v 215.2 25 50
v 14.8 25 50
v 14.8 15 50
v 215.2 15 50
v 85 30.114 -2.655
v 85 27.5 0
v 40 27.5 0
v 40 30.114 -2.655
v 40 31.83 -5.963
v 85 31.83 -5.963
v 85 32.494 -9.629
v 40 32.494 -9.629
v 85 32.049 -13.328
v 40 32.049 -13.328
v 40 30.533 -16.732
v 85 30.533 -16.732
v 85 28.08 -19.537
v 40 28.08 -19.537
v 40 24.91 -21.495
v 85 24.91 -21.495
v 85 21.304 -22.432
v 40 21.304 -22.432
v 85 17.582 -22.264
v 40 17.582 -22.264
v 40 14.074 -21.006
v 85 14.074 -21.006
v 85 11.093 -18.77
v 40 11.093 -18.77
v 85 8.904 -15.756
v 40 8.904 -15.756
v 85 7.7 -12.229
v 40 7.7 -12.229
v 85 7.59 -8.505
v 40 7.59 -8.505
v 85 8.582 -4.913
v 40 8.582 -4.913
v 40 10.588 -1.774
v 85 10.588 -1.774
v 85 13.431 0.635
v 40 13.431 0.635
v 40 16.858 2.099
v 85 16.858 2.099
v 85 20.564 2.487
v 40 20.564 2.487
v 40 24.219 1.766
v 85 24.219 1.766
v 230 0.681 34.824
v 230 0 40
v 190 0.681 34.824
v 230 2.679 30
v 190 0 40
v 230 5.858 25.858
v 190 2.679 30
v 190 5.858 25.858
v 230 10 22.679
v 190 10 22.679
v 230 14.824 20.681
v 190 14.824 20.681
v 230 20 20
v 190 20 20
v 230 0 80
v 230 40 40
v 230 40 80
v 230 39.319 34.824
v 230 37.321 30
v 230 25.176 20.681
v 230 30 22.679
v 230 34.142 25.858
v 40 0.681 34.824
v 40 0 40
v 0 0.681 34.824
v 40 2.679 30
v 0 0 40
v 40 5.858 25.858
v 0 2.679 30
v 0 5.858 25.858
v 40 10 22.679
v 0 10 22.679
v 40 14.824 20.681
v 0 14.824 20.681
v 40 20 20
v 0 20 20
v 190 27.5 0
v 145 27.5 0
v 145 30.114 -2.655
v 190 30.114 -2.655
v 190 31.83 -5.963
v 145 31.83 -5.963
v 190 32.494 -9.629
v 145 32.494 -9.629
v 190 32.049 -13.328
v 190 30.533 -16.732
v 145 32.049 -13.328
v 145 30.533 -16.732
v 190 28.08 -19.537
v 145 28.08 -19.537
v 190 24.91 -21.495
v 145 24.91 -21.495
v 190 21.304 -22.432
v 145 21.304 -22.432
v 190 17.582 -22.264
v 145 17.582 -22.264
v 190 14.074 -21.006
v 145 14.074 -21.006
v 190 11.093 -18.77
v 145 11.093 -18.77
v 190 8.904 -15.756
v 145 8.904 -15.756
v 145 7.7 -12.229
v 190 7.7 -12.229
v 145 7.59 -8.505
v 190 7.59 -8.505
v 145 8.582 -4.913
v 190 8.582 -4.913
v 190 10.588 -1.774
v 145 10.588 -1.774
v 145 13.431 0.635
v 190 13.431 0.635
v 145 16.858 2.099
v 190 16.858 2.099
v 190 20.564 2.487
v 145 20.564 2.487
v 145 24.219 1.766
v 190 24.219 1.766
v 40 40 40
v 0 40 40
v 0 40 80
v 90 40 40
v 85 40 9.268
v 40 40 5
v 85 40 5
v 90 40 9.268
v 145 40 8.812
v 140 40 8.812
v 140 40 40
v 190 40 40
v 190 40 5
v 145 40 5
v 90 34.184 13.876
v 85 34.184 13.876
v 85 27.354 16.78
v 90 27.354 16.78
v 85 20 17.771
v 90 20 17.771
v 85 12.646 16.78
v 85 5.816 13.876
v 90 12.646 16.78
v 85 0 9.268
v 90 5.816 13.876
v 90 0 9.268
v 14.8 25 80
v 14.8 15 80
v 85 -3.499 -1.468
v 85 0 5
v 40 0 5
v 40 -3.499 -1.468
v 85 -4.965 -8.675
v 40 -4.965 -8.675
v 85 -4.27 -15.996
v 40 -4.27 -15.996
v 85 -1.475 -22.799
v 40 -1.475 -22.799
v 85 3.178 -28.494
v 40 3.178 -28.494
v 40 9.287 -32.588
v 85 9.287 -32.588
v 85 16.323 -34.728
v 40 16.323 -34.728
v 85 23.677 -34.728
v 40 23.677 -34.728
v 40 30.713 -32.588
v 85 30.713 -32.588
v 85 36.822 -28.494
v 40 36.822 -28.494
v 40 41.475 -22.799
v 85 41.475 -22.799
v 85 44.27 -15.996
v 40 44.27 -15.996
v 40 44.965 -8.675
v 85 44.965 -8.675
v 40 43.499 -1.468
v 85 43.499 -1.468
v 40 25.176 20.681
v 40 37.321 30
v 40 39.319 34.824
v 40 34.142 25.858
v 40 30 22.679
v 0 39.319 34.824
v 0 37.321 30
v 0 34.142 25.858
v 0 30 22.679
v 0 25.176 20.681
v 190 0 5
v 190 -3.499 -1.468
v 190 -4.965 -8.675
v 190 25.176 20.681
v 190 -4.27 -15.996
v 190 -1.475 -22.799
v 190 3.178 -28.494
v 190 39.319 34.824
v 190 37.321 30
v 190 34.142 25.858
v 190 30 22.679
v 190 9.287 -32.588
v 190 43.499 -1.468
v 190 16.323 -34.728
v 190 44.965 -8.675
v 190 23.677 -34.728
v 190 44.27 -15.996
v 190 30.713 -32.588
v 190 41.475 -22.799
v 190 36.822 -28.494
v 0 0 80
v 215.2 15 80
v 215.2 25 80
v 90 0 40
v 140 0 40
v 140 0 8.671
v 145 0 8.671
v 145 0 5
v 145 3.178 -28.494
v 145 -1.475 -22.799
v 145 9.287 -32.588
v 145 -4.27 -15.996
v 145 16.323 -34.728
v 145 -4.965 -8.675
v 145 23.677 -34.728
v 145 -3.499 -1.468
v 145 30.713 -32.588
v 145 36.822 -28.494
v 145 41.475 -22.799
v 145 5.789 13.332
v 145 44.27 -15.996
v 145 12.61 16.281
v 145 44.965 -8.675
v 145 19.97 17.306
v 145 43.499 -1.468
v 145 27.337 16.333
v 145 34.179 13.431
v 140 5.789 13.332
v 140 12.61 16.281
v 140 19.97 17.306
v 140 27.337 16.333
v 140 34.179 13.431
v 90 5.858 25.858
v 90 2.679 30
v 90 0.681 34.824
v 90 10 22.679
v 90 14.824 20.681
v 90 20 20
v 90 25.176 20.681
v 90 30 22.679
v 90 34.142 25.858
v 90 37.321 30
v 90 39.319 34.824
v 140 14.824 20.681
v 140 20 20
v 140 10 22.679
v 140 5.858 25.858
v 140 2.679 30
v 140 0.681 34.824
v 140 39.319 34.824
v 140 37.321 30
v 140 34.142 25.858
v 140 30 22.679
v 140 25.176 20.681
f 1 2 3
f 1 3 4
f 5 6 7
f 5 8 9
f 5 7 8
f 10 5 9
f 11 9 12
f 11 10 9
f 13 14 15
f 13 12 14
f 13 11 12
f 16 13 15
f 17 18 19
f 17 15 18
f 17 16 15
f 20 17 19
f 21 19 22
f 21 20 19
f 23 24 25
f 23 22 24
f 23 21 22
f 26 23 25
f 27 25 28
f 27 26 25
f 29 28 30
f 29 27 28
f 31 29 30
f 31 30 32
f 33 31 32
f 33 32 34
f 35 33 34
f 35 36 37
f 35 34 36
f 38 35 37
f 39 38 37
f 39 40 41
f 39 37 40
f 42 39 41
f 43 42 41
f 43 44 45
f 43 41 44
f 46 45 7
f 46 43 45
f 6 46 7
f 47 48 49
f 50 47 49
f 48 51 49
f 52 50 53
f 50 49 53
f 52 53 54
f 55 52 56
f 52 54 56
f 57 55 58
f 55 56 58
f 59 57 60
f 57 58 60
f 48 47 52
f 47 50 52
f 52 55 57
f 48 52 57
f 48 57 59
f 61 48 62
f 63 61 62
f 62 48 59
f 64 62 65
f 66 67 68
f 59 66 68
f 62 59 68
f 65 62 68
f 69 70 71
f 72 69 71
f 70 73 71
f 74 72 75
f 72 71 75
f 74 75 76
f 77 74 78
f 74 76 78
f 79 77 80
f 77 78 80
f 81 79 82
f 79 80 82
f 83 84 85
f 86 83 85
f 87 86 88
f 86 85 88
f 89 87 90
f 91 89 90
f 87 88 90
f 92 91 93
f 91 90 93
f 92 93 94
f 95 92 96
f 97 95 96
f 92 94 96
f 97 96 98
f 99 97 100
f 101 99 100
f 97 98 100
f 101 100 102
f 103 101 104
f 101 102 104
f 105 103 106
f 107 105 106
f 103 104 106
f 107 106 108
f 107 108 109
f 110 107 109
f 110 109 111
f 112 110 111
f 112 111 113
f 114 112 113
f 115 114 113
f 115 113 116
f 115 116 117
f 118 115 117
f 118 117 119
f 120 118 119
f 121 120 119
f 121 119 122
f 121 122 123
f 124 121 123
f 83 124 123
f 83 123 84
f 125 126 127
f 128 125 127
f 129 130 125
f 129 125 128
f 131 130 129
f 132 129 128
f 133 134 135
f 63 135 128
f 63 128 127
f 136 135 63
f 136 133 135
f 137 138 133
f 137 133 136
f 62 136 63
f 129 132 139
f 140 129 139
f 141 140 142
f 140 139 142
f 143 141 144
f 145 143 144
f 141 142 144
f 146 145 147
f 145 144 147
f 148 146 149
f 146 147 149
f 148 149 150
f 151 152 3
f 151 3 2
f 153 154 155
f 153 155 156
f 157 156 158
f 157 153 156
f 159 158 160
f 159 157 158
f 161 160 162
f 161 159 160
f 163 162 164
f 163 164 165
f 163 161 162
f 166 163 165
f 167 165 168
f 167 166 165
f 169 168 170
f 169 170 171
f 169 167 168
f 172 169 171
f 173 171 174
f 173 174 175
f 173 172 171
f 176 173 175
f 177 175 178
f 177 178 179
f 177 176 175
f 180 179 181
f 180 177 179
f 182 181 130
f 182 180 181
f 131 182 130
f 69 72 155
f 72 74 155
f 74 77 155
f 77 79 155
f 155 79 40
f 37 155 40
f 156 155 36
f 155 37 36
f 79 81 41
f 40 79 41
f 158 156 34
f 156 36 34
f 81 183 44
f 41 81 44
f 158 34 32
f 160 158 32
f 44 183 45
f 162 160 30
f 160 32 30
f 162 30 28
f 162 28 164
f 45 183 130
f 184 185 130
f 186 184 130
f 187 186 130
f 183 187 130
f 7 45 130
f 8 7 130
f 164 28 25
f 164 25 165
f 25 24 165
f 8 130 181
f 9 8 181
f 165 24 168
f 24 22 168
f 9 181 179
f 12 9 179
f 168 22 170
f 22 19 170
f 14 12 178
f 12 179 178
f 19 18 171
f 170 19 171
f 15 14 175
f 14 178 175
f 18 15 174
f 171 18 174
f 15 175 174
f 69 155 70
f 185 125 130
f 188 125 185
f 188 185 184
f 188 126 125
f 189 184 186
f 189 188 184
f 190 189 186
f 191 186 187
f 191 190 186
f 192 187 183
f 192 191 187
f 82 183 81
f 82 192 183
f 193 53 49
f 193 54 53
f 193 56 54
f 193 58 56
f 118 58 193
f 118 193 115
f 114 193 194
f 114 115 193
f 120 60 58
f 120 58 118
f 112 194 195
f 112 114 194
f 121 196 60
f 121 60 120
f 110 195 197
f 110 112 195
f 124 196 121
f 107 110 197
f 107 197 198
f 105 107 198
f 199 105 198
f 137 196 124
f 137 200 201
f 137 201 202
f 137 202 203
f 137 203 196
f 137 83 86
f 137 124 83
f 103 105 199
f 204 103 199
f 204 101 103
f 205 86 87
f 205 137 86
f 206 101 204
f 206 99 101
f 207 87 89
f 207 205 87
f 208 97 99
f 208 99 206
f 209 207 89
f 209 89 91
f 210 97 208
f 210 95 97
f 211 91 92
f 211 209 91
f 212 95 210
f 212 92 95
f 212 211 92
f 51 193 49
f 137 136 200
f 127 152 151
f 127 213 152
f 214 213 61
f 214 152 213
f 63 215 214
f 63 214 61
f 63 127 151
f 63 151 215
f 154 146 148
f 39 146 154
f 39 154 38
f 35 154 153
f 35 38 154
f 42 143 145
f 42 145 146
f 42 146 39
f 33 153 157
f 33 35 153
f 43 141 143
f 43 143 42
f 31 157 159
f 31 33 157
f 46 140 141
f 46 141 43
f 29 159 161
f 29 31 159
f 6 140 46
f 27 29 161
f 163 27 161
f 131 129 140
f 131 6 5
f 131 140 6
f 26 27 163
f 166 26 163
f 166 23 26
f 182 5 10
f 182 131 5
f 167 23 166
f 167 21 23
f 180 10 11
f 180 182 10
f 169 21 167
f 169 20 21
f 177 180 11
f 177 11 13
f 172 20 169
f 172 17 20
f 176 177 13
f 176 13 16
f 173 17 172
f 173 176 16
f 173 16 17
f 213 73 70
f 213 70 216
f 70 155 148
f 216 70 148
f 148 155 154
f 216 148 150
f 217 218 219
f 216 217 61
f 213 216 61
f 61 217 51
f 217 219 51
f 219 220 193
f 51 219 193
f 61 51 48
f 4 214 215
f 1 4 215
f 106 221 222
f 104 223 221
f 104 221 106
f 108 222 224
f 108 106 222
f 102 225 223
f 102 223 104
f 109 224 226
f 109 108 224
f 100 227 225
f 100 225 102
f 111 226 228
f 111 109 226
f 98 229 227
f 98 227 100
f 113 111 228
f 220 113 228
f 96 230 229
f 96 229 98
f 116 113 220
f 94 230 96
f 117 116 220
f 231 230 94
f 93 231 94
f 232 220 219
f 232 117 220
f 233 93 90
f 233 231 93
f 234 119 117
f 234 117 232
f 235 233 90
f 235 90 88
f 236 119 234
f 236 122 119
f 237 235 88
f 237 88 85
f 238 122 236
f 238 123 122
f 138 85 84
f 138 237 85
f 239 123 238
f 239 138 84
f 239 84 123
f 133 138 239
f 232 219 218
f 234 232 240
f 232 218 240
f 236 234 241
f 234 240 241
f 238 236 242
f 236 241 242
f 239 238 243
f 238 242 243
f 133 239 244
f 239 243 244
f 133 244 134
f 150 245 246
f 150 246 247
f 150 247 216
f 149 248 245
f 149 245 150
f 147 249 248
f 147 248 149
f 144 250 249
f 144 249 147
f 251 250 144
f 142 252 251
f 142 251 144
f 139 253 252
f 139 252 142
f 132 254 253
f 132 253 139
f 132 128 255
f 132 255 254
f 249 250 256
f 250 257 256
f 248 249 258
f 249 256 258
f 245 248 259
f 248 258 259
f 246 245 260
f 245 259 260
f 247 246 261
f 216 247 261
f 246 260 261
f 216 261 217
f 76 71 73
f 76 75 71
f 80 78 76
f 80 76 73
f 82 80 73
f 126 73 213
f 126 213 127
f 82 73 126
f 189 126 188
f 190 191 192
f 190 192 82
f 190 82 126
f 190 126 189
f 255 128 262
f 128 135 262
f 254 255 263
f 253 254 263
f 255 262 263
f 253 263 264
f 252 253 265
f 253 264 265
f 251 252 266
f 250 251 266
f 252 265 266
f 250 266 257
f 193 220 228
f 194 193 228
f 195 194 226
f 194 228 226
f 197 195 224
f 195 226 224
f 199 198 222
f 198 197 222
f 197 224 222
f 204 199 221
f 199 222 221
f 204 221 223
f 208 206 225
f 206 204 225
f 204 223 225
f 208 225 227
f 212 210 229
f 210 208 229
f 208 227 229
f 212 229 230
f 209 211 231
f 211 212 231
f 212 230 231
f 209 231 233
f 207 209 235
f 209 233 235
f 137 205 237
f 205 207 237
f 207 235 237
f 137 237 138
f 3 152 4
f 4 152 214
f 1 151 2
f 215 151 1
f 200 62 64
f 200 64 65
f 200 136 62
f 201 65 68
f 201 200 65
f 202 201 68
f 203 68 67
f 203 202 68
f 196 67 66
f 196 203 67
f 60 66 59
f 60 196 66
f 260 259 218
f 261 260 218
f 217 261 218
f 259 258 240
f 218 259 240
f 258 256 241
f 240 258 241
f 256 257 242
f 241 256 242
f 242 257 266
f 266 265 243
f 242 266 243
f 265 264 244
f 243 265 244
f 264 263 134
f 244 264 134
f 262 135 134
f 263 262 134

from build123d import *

# Parameters (mm, degrees)
SKETCH2_W            = 230
SKETCH2_H            = 40
BOSS_EXTRUDE1_DEPTH  = 80
SKETCH3_W            = 200.4
SKETCH3_H            = 10
CUT_EXTRUDE1_DEPTH   = 30
SKETCH6_R            = 25
BOSS_EXTRUDE3_DEPTH  = 50
SKETCH7_R            = 12.5
CUT_EXTRUDE2_DEPTH   = 50
SKETCH8_R            = 26.5
CUT_EXTRUDE3_DEPTH   = 25
CUT_EXTRUDE4_START   = 40
SKETCH11_R           = 26.5
CUT_EXTRUDE4_DEPTH   = 40
SKETCH14_W           = 12.614661349
SKETCH14_H           = 40
CUT_EXTRUDE6_DEPTH   = 50
FILLET3_R            = 20
FILLET3_OF_MIRROR5_R = 20
FILLET3_OF_MIRROR8_R = 20
SKETCH15_R           = 27.771194789
CUT_EXTRUDE7_DEPTH   = 5
SKETCH21_R           = 27.635802496
CUT_EXTRUDE8_DEPTH   = 5


with BuildPart() as part:
    # Sketch2 → Boss-Extrude1 (new body)
    with BuildSketch(Plane.XY):
        with Locations((115, 20)):
            Rectangle(SKETCH2_W, SKETCH2_H)
    extrude(amount=BOSS_EXTRUDE1_DEPTH)

    # Sketch3 → Cut-Extrude1 (cut)
    with BuildSketch(Plane.XY.offset(80)):
        with Locations((115, 20)):
            Rectangle(SKETCH3_W, SKETCH3_H)
    extrude(amount=-CUT_EXTRUDE1_DEPTH, mode=Mode.SUBTRACT)

    # Sketch6 → Boss-Extrude3 (add)
    with BuildSketch(Plane(origin=(140, 0, 0), x_dir=(0, 0, -1), z_dir=(1, 0, 0))):
        with Locations((10, 20)):
            Circle(SKETCH6_R)
    boss_extrude3 = extrude(amount=BOSS_EXTRUDE3_DEPTH)

    # Sketch7 → Cut-Extrude2 (cut)
    with BuildSketch(Plane.ZY.offset(-140)):
        with Locations(Location((-10, 20, 0), (0, 0, 36.869897646))):
            Circle(SKETCH7_R)
    cut_extrude2 = extrude(amount=-CUT_EXTRUDE2_DEPTH, mode=Mode.SUBTRACT)

    # Sketch8 → Cut-Extrude3 (cut)
    with BuildSketch(Plane.ZY.offset(-140)):
        with Locations((-10, 20)):
            Circle(SKETCH8_R)
    cut_extrude3 = extrude(amount=CUT_EXTRUDE3_DEPTH, mode=Mode.SUBTRACT)

    # Sketch11 → Cut-Extrude4 (cut)
    with BuildSketch(Plane(origin=(190, 0, 0), x_dir=(0, 0, -1), z_dir=(1, 0, 0)).offset(CUT_EXTRUDE4_START)):
        with Locations((10, 20)):
            Circle(SKETCH11_R)
    cut_extrude4 = extrude(amount=-CUT_EXTRUDE4_DEPTH, mode=Mode.SUBTRACT)

    # Mirror1: Boss-Extrude3, Cut-Extrude2, Cut-Extrude3, Cut-Extrude4 across plane
    add(boss_extrude3.mirror(Plane(origin=(115, 0, 0), x_dir=(0, 0, 1), z_dir=(1, 0, 0))))
    add(cut_extrude2.mirror(Plane(origin=(115, 0, 0), x_dir=(0, 0, 1), z_dir=(1, 0, 0))), mode=Mode.SUBTRACT)
    add(cut_extrude3.mirror(Plane(origin=(115, 0, 0), x_dir=(0, 0, 1), z_dir=(1, 0, 0))), mode=Mode.SUBTRACT)
    add(cut_extrude4.mirror(Plane(origin=(115, 0, 0), x_dir=(0, 0, 1), z_dir=(1, 0, 0))), mode=Mode.SUBTRACT)

    # Sketch14 → Cut-Extrude6 (cut)
    with BuildSketch(Plane(origin=(90, 0, 0), x_dir=(0, 0, -1), z_dir=(1, 0, 0))):
        with Locations((-13.692669326, 20)):
            Rectangle(SKETCH14_W, SKETCH14_H)
    cut_extrude6 = extrude(amount=CUT_EXTRUDE6_DEPTH, mode=Mode.SUBTRACT)

    # Fillet3
    fillet3_edges = [part.edges().sort_by_distance(p)[0] for p in [
        (115, 40, 20),
        (115, 0, 20),
    ]]
    fillet(fillet3_edges, radius=FILLET3_R - 0.0001)  # a hair under: the kernel refuses the full size

    # Mirror5: Cut-Extrude6 across plane
    add(cut_extrude6.mirror(Plane.ZY.offset(-165)), mode=Mode.SUBTRACT)

    # Fillet3 of Mirror5
    fillet3_of_mirror5_edges = [part.edges().sort_by_distance(p)[0] for p in [
        (210, 40, 20),
        (210, 0, 20),
    ]]
    fillet(fillet3_of_mirror5_edges, radius=FILLET3_OF_MIRROR5_R - 0.0001)  # a hair under: the kernel refuses the full size

    # Mirror8: Cut-Extrude6 across plane
    add(cut_extrude6.mirror(Plane(origin=(65, 0, 0), x_dir=(0, 0, 1), z_dir=(1, 0, 0))), mode=Mode.SUBTRACT)

    # Fillet3 of Mirror8
    fillet3_of_mirror8_edges = [part.edges().sort_by_distance(p)[0] for p in [
        (20, 40, 20),
        (20, 0, 20),
    ]]
    fillet(fillet3_of_mirror8_edges, radius=FILLET3_OF_MIRROR8_R - 0.0001)  # a hair under: the kernel refuses the full size

    # Sketch15 → Cut-Extrude7 (cut)
    with BuildSketch(Plane(origin=(90, 0, 0), x_dir=(0, 0, -1), z_dir=(1, 0, 0))):
        with Locations((10, 20)):
            Circle(SKETCH15_R)
    extrude(amount=-CUT_EXTRUDE7_DEPTH, mode=Mode.SUBTRACT)

    # Sketch21 → Cut-Extrude8 (cut)
    with BuildSketch(Plane.ZY.offset(-140)):
        with Locations((-10.3298846, 20.067055547)):
            Circle(SKETCH21_R)
    extrude(amount=-CUT_EXTRUDE8_DEPTH, mode=Mode.SUBTRACT)


solid = part.part
